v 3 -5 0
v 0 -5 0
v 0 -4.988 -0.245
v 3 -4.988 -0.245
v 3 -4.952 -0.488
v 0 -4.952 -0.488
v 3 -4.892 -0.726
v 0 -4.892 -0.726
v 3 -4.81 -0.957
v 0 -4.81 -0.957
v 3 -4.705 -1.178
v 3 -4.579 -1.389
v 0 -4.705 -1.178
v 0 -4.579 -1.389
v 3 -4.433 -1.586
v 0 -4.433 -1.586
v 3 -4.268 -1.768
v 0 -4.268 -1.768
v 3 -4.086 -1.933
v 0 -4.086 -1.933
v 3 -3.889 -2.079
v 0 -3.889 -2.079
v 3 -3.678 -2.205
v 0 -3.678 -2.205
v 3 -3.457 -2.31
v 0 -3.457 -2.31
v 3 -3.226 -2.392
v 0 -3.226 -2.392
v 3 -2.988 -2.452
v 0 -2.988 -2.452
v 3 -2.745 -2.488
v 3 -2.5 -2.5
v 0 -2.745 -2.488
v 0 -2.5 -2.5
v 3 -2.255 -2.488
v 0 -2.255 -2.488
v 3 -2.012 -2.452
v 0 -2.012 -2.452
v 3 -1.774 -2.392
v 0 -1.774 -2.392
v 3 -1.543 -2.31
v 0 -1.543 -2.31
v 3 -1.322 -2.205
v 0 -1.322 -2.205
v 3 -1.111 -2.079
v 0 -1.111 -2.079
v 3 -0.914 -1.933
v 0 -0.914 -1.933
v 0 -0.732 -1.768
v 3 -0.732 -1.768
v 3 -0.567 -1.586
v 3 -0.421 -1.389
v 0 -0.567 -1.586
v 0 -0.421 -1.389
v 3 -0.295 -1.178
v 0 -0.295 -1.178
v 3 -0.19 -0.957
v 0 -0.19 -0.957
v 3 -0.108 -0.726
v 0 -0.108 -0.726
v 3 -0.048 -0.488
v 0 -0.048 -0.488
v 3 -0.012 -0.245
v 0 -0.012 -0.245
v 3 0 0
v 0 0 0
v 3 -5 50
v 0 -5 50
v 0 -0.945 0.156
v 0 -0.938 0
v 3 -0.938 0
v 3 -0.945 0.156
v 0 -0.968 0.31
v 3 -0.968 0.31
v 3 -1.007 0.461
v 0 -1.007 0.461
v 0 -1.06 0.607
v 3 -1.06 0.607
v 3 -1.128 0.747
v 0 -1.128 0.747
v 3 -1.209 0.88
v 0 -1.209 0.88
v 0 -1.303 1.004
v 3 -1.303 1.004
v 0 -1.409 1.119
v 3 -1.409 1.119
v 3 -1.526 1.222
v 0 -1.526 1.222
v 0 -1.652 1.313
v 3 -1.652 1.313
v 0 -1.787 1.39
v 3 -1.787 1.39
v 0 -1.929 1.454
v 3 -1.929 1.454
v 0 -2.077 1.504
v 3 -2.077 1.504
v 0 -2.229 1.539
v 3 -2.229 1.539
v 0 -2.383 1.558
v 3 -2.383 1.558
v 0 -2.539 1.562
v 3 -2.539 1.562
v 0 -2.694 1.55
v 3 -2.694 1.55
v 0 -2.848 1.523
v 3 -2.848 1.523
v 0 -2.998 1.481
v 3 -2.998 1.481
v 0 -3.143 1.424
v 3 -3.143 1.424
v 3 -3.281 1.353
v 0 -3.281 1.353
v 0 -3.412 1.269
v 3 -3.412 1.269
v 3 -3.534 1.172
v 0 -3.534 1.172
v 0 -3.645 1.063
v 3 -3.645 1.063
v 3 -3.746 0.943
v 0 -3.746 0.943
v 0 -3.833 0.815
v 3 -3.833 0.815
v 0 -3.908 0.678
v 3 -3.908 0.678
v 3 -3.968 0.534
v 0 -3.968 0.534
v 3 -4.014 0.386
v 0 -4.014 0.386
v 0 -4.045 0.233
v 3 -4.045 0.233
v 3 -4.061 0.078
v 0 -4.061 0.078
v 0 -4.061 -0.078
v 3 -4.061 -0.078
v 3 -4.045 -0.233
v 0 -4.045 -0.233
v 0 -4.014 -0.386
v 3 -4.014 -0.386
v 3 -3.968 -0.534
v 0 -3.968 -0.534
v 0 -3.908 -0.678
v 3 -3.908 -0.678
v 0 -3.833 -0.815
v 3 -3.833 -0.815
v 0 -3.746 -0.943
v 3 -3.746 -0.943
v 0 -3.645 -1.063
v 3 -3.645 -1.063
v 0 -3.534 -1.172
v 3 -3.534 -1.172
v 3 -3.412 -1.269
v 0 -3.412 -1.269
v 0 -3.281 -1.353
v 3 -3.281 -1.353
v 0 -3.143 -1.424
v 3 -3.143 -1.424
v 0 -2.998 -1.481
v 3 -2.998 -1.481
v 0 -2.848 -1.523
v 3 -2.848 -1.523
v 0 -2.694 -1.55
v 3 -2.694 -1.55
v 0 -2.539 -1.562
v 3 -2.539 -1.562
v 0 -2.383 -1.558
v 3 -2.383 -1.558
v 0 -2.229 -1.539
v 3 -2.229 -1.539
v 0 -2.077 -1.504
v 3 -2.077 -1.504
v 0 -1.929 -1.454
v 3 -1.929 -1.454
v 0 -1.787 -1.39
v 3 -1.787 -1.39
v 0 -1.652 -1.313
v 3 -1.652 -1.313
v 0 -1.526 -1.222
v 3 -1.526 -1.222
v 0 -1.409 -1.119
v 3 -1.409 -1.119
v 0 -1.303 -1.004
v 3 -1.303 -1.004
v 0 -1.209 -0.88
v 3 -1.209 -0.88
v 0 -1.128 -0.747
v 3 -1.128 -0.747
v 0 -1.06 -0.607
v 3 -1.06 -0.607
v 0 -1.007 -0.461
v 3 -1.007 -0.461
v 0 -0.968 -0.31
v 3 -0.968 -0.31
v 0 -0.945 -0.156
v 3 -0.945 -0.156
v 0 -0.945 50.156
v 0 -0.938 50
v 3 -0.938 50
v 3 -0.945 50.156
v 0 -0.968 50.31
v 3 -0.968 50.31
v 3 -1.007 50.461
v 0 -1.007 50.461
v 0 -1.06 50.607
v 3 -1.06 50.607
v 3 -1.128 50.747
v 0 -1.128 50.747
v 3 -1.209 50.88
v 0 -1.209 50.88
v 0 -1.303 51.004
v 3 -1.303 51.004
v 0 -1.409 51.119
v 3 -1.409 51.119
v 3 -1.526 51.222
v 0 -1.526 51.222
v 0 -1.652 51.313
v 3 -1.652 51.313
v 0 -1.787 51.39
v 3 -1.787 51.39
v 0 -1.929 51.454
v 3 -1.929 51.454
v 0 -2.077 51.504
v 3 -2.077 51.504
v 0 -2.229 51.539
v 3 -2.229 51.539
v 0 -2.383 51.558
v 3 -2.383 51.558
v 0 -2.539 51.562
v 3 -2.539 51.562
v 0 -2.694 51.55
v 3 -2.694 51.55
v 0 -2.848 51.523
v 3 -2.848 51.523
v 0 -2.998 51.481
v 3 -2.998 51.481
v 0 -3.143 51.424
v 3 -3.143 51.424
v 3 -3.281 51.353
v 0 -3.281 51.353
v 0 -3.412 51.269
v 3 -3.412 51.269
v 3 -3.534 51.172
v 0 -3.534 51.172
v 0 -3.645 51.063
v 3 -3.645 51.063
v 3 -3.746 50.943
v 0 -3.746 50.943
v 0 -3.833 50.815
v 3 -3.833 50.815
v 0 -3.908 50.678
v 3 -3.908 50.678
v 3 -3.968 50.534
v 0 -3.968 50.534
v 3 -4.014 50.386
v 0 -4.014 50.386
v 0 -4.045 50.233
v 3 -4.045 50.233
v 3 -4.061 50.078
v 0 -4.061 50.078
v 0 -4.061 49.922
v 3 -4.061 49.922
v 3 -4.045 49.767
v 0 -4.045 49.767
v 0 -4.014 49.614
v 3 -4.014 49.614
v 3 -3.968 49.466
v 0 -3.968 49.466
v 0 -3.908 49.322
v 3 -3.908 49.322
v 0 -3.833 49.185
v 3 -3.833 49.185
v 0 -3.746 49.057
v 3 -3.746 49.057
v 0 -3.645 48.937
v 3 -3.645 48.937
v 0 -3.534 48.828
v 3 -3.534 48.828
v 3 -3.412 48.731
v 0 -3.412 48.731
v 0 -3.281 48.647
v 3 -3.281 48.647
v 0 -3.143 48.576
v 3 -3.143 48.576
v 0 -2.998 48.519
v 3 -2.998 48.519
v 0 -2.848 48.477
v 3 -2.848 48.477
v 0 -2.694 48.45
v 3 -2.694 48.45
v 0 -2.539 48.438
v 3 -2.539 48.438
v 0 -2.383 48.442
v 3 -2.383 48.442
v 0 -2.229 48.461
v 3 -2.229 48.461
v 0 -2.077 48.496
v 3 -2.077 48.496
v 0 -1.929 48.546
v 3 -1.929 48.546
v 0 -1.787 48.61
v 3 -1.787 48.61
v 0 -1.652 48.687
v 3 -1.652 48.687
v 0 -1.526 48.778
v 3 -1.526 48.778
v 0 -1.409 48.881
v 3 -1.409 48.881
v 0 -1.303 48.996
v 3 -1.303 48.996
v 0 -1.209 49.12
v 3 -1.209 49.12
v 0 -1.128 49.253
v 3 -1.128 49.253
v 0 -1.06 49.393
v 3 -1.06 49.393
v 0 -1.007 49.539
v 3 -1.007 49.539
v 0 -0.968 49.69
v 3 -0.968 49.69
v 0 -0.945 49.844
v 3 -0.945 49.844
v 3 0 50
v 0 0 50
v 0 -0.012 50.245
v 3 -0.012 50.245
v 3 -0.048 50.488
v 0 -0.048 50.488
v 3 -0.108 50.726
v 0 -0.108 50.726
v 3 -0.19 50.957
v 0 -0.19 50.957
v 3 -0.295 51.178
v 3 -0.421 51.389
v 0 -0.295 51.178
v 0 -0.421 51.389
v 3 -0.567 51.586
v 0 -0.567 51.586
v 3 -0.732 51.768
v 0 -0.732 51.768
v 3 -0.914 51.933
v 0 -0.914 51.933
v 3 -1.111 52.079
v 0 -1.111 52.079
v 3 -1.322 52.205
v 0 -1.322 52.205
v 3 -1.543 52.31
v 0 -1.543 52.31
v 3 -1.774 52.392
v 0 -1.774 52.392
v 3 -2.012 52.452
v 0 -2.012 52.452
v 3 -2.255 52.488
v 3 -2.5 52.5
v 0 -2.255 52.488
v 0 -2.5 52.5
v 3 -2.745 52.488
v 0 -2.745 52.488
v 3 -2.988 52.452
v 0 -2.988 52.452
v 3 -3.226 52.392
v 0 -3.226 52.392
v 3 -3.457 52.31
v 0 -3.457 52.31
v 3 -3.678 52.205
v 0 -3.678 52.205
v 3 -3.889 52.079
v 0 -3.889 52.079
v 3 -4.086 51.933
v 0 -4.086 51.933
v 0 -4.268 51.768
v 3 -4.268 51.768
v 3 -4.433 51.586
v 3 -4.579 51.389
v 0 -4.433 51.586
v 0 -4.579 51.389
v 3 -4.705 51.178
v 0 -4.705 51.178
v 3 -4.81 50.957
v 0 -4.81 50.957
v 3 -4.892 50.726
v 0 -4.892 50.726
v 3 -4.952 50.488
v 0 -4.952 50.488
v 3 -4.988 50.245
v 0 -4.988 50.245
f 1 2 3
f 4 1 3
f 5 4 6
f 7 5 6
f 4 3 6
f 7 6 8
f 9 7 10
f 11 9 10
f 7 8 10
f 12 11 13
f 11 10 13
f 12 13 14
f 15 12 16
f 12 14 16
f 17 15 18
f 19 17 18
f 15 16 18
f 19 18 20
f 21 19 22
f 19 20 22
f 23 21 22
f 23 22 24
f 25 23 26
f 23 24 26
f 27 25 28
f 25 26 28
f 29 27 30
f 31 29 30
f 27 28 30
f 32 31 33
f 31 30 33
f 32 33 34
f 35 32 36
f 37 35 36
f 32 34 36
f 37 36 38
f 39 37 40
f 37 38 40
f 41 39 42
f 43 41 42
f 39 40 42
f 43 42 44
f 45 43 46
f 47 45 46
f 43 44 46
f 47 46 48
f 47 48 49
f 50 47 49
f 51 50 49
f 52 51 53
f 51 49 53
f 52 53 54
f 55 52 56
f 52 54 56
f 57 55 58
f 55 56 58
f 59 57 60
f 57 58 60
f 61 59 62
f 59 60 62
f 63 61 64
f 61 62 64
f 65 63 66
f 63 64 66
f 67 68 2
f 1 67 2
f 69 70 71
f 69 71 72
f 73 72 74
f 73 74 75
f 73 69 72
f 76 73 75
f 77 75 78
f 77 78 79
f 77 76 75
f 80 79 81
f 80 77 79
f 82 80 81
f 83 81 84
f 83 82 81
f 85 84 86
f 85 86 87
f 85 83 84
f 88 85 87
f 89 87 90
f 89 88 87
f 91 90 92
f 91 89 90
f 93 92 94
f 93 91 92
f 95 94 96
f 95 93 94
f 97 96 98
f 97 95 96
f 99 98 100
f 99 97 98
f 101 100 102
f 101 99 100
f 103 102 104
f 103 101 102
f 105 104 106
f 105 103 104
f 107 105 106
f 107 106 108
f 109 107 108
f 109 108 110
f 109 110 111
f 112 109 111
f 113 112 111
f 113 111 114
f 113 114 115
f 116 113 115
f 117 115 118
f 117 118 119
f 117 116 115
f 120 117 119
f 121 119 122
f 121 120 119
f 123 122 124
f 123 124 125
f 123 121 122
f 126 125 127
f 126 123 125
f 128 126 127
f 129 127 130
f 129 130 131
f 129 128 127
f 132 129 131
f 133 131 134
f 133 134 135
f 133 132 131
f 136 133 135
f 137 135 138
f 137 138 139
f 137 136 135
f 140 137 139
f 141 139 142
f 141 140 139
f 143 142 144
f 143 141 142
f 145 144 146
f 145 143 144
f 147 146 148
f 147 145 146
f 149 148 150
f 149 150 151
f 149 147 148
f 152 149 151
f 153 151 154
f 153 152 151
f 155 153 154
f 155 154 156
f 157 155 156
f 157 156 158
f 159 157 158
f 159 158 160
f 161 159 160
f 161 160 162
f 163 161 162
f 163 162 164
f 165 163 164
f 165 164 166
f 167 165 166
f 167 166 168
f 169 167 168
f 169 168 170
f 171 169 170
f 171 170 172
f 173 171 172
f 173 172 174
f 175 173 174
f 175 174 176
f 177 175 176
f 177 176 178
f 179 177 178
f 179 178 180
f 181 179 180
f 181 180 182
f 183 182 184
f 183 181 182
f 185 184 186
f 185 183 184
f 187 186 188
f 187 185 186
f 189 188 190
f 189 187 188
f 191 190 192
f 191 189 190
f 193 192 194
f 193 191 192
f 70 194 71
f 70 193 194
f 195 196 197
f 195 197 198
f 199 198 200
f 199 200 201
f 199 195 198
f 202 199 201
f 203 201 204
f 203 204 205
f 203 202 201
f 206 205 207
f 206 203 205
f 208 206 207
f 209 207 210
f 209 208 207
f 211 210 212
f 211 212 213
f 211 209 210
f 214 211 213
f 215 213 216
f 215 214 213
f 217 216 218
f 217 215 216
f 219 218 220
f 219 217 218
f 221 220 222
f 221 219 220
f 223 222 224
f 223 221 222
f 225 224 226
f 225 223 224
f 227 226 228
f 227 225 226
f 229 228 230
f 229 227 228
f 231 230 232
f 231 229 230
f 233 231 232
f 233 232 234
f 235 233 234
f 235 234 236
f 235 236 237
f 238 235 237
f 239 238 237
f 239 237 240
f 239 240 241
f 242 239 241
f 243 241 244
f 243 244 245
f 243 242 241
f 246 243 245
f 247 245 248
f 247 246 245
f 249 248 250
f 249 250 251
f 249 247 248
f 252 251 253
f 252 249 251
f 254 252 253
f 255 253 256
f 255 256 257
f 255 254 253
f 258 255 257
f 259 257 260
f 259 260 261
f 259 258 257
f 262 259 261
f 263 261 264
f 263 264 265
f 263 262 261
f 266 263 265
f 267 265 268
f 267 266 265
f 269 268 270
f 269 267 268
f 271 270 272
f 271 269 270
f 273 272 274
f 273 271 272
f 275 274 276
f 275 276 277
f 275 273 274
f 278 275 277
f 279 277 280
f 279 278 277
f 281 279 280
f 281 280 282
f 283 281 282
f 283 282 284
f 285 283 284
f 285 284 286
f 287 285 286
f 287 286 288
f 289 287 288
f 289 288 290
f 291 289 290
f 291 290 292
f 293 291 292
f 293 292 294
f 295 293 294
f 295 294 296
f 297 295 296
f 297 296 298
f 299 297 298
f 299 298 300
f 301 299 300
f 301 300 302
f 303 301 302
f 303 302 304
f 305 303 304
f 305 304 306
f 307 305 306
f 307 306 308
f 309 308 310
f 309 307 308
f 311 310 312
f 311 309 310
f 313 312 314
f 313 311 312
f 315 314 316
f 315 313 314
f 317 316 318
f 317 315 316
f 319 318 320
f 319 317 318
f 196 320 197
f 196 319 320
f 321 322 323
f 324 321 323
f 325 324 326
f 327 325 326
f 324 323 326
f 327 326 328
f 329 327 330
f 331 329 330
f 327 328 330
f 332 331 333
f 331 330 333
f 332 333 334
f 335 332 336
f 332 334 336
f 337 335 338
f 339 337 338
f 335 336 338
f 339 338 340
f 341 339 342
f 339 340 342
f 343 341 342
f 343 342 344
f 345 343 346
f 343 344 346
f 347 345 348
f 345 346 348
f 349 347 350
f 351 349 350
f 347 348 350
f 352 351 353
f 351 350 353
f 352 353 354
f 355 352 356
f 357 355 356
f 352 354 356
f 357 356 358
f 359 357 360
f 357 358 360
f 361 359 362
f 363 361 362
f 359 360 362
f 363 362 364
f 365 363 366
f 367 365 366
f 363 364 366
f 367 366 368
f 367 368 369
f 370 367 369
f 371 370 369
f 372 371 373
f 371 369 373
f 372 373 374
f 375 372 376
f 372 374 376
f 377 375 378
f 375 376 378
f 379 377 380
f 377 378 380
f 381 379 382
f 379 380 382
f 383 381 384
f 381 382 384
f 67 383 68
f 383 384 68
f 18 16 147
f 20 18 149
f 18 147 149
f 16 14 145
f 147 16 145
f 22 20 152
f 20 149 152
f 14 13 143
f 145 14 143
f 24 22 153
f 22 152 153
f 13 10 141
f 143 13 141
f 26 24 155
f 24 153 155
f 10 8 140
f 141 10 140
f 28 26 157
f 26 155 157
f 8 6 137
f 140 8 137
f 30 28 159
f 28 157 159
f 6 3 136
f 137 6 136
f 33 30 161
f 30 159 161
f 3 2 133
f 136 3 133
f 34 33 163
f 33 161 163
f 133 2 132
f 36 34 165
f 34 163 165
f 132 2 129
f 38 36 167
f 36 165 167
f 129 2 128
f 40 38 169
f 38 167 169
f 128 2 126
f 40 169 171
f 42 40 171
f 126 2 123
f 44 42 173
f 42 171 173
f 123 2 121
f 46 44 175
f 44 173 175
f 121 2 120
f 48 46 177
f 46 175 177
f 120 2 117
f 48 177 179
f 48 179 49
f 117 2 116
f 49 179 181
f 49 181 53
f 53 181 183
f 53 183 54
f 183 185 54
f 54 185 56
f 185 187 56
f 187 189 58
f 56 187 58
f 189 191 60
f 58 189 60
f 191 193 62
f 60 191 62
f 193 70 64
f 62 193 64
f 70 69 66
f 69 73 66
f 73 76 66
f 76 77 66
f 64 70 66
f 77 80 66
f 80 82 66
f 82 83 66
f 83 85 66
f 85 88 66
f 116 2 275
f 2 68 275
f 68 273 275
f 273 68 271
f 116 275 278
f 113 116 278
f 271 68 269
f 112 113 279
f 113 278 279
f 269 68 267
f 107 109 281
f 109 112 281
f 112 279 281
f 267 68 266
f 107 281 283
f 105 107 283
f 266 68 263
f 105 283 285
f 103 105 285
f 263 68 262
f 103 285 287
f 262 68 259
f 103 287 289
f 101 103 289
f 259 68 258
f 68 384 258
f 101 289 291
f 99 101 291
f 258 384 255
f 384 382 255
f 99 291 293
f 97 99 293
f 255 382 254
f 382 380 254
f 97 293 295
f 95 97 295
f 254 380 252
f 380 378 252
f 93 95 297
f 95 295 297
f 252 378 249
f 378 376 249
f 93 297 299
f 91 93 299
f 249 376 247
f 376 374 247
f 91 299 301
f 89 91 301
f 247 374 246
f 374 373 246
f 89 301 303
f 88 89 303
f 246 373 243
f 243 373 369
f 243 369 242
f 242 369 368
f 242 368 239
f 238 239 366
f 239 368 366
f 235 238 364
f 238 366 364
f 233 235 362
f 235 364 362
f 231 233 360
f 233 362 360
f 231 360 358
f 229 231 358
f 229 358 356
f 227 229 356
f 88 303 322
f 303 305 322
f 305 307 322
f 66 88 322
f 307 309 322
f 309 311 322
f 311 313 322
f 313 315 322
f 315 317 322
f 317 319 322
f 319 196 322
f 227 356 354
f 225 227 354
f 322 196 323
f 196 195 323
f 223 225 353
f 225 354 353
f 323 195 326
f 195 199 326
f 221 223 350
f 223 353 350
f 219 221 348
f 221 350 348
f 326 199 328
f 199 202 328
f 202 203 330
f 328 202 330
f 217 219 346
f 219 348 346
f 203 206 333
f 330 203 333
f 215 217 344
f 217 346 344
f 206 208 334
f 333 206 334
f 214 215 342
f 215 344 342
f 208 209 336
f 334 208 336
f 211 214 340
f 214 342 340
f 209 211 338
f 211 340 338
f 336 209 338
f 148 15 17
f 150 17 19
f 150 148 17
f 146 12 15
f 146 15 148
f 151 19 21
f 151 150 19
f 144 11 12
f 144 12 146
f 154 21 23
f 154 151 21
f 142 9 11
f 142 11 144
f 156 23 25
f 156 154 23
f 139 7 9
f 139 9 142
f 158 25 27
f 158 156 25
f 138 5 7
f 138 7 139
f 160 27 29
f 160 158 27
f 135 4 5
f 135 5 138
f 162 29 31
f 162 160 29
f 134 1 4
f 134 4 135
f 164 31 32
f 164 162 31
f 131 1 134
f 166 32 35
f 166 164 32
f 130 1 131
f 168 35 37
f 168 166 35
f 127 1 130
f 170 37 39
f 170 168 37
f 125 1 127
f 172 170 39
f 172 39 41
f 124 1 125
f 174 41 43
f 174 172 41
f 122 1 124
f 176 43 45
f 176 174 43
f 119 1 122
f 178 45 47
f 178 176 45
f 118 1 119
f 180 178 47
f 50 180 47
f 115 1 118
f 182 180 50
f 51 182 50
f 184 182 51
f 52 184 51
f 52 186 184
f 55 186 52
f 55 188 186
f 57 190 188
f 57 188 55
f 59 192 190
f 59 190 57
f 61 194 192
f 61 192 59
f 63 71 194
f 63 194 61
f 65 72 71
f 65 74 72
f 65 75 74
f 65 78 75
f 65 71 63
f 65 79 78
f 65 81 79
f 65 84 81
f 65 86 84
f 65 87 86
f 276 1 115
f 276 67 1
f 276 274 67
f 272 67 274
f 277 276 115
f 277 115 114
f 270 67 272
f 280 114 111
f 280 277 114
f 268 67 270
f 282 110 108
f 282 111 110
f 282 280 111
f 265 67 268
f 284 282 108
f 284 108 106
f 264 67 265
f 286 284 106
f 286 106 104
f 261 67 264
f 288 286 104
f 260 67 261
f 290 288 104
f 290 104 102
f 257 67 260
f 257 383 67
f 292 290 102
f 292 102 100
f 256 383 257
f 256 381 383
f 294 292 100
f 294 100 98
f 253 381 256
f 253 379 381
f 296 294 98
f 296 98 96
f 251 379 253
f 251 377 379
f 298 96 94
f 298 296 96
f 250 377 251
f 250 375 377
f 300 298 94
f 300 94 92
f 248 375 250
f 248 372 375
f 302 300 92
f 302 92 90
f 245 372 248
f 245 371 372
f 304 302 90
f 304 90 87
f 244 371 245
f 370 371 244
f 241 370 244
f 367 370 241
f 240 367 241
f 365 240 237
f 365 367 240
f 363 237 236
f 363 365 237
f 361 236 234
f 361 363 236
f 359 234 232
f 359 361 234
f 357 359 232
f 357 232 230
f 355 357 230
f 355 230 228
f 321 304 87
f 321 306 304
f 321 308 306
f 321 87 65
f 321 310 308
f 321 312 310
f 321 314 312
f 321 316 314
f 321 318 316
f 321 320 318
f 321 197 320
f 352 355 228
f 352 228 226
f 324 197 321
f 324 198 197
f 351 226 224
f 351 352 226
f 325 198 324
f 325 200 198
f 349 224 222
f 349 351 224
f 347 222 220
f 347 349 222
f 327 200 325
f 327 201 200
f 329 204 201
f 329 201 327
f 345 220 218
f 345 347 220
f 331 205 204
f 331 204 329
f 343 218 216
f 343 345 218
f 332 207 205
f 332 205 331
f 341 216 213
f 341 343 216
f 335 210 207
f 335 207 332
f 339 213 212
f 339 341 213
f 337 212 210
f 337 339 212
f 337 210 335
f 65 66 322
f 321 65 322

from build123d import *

# Parameters (mm, degrees)
F0_R     = 1.5625
F1_DEPTH = 3


with BuildPart() as f1:
    # F0 (on Right) → F1 (new body)
    with BuildSketch(Plane.YZ):
        with BuildLine():
            ThreePointArc((-5, 0), (-2.5, -2.5), (0, 0))
            Line((0, 0), (0, 50))
            ThreePointArc((0, 50), (-2.5, 52.5), (-5, 50))
            Line((-5, 50), (-5, 0))
        make_face()
        with Locations((-2.5, 0)):
            Circle(F0_R, mode=Mode.SUBTRACT)
        with Locations((-2.5, 50)):
            Circle(F0_R, mode=Mode.SUBTRACT)
    extrude(amount=F1_DEPTH)


solid = f1.part
